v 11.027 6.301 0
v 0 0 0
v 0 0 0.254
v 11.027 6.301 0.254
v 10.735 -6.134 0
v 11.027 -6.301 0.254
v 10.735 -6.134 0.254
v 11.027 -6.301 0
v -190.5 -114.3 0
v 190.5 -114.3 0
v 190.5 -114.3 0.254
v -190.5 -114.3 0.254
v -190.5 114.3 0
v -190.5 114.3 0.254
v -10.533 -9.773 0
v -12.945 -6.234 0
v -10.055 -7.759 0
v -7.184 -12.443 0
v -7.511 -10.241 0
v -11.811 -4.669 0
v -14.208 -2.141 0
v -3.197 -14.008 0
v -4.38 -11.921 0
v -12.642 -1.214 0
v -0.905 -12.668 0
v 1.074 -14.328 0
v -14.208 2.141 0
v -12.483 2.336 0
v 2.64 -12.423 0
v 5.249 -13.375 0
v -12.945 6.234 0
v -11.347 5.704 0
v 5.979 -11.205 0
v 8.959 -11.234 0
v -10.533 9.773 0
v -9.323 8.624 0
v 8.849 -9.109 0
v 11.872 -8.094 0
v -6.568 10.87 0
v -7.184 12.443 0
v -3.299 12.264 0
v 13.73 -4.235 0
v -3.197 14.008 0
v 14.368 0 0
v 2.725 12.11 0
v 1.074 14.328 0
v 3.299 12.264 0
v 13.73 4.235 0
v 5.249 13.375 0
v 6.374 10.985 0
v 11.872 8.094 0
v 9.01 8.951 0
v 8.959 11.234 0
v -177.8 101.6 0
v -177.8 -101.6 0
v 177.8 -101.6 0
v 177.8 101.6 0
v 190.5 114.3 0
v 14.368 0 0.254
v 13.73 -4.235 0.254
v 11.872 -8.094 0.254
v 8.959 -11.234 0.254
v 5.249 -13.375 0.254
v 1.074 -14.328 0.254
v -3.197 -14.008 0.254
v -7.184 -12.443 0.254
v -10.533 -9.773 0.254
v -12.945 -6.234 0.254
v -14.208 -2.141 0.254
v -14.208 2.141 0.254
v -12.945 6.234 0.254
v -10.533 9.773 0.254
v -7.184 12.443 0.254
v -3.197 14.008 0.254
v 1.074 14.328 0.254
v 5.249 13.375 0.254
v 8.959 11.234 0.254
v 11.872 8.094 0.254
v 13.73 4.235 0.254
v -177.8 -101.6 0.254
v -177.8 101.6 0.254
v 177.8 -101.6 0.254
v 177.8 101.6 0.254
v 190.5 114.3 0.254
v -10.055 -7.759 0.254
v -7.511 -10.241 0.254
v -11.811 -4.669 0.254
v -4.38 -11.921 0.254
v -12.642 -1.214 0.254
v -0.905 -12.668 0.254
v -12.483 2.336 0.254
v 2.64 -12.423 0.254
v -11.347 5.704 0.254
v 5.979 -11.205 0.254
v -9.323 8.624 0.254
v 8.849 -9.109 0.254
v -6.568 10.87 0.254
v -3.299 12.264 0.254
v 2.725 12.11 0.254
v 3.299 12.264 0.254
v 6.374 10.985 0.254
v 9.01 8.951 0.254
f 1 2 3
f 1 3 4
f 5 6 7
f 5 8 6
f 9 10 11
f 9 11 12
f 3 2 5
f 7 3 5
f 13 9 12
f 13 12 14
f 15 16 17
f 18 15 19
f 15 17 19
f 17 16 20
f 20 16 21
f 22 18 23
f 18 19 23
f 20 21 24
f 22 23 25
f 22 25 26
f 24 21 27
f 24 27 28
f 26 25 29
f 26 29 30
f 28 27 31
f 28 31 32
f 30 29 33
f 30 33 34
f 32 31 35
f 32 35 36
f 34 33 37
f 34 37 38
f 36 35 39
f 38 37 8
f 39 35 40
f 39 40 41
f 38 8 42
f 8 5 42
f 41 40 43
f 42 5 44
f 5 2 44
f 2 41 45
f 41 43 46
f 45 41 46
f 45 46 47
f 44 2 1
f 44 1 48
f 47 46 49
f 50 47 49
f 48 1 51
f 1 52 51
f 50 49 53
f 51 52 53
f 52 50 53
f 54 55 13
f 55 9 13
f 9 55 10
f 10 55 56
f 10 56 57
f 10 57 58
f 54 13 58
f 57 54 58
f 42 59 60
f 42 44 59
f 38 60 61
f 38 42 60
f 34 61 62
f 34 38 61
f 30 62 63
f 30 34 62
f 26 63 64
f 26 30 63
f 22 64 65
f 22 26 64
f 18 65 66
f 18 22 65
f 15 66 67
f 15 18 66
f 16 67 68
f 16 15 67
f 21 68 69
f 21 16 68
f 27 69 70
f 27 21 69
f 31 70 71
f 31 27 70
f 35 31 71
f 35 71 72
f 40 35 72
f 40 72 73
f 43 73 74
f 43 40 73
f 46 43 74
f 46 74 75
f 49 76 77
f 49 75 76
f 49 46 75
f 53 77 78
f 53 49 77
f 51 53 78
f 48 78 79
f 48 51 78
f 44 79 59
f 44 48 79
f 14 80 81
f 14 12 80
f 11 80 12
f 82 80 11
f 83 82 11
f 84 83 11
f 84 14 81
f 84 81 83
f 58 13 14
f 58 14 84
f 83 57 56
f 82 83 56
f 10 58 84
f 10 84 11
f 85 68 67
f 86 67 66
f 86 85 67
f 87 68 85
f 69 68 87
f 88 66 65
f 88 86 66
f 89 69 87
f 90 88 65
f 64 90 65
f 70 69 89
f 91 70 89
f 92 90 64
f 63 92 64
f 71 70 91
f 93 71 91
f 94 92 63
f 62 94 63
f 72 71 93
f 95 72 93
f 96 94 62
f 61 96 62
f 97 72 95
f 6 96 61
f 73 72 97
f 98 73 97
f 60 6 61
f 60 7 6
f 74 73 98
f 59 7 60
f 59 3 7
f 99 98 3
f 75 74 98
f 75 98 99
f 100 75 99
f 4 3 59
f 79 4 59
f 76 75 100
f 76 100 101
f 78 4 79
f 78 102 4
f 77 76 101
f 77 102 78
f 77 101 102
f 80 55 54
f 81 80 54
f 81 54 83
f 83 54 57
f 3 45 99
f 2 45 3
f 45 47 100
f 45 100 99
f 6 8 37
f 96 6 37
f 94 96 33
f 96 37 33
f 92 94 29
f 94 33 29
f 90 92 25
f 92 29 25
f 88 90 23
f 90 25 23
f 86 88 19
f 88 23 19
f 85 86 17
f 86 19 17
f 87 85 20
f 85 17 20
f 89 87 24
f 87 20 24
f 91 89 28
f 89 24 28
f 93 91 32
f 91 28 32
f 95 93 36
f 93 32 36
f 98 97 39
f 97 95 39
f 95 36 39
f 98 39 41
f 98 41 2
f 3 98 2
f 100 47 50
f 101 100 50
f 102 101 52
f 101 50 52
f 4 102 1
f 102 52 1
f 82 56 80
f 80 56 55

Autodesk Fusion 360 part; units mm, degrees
sketch "Sketch1" plane through (0, 0, 0) normal (0, 0, 1) x (1, 0, 0)
  line L0 (-177.8, 101.6) -> (177.8, 101.6)
  line L1 (177.8, 101.6) -> (177.8, -101.6)
  line L2 (177.8, -101.6) -> (-177.8, -101.6)
  line L3 (-177.8, -101.6) -> (-177.8, 101.6)
  line L4 (-177.8, 101.6) -> (177.8, -101.6) construction
  line L5 (177.8, 101.6) -> (-177.8, -101.6) construction
  circle A0 centre (0, 0) radius 12.7
  line L6 (11.0267, -6.301) -> (10.7347, -6.1341)
  line L7 (0, 0) -> (11.0267, -6.301)
  line L8 (0, 0) -> (11.0267, 6.301)
  line L9 (-3.2992, 12.264) -> (0, 0)
  line L10 (3.2992, 12.264) -> (2.725, 12.1095)
  line L11 (2.725, 12.1095) -> (0, 0)
  circle A1 centre (0, 0) radius 14.3684
  line L12 (190.5, -114.3) -> (-190.5, -114.3)
  line L13 (-190.5, -114.3) -> (-190.5, 114.3)
  line L14 (-190.5, 114.3) -> (190.5, 114.3)
  line L15 (190.5, 114.3) -> (190.5, -114.3)
  dimension "d1" = 355.6
  dimension "d2" = 203.2
  dimension "d3" = -12.7
extrude "Extrude1" add sketch "Sketch1" along normal blind 0.254 contours A0 L6 L7 L8 | A0 L9 L10 L11 | A1 | L12 L13 L14 L15 makes body 1 at (8.465, -2.1003, 0) makes body 2 at (-59.2667, -110.0667, 0)
